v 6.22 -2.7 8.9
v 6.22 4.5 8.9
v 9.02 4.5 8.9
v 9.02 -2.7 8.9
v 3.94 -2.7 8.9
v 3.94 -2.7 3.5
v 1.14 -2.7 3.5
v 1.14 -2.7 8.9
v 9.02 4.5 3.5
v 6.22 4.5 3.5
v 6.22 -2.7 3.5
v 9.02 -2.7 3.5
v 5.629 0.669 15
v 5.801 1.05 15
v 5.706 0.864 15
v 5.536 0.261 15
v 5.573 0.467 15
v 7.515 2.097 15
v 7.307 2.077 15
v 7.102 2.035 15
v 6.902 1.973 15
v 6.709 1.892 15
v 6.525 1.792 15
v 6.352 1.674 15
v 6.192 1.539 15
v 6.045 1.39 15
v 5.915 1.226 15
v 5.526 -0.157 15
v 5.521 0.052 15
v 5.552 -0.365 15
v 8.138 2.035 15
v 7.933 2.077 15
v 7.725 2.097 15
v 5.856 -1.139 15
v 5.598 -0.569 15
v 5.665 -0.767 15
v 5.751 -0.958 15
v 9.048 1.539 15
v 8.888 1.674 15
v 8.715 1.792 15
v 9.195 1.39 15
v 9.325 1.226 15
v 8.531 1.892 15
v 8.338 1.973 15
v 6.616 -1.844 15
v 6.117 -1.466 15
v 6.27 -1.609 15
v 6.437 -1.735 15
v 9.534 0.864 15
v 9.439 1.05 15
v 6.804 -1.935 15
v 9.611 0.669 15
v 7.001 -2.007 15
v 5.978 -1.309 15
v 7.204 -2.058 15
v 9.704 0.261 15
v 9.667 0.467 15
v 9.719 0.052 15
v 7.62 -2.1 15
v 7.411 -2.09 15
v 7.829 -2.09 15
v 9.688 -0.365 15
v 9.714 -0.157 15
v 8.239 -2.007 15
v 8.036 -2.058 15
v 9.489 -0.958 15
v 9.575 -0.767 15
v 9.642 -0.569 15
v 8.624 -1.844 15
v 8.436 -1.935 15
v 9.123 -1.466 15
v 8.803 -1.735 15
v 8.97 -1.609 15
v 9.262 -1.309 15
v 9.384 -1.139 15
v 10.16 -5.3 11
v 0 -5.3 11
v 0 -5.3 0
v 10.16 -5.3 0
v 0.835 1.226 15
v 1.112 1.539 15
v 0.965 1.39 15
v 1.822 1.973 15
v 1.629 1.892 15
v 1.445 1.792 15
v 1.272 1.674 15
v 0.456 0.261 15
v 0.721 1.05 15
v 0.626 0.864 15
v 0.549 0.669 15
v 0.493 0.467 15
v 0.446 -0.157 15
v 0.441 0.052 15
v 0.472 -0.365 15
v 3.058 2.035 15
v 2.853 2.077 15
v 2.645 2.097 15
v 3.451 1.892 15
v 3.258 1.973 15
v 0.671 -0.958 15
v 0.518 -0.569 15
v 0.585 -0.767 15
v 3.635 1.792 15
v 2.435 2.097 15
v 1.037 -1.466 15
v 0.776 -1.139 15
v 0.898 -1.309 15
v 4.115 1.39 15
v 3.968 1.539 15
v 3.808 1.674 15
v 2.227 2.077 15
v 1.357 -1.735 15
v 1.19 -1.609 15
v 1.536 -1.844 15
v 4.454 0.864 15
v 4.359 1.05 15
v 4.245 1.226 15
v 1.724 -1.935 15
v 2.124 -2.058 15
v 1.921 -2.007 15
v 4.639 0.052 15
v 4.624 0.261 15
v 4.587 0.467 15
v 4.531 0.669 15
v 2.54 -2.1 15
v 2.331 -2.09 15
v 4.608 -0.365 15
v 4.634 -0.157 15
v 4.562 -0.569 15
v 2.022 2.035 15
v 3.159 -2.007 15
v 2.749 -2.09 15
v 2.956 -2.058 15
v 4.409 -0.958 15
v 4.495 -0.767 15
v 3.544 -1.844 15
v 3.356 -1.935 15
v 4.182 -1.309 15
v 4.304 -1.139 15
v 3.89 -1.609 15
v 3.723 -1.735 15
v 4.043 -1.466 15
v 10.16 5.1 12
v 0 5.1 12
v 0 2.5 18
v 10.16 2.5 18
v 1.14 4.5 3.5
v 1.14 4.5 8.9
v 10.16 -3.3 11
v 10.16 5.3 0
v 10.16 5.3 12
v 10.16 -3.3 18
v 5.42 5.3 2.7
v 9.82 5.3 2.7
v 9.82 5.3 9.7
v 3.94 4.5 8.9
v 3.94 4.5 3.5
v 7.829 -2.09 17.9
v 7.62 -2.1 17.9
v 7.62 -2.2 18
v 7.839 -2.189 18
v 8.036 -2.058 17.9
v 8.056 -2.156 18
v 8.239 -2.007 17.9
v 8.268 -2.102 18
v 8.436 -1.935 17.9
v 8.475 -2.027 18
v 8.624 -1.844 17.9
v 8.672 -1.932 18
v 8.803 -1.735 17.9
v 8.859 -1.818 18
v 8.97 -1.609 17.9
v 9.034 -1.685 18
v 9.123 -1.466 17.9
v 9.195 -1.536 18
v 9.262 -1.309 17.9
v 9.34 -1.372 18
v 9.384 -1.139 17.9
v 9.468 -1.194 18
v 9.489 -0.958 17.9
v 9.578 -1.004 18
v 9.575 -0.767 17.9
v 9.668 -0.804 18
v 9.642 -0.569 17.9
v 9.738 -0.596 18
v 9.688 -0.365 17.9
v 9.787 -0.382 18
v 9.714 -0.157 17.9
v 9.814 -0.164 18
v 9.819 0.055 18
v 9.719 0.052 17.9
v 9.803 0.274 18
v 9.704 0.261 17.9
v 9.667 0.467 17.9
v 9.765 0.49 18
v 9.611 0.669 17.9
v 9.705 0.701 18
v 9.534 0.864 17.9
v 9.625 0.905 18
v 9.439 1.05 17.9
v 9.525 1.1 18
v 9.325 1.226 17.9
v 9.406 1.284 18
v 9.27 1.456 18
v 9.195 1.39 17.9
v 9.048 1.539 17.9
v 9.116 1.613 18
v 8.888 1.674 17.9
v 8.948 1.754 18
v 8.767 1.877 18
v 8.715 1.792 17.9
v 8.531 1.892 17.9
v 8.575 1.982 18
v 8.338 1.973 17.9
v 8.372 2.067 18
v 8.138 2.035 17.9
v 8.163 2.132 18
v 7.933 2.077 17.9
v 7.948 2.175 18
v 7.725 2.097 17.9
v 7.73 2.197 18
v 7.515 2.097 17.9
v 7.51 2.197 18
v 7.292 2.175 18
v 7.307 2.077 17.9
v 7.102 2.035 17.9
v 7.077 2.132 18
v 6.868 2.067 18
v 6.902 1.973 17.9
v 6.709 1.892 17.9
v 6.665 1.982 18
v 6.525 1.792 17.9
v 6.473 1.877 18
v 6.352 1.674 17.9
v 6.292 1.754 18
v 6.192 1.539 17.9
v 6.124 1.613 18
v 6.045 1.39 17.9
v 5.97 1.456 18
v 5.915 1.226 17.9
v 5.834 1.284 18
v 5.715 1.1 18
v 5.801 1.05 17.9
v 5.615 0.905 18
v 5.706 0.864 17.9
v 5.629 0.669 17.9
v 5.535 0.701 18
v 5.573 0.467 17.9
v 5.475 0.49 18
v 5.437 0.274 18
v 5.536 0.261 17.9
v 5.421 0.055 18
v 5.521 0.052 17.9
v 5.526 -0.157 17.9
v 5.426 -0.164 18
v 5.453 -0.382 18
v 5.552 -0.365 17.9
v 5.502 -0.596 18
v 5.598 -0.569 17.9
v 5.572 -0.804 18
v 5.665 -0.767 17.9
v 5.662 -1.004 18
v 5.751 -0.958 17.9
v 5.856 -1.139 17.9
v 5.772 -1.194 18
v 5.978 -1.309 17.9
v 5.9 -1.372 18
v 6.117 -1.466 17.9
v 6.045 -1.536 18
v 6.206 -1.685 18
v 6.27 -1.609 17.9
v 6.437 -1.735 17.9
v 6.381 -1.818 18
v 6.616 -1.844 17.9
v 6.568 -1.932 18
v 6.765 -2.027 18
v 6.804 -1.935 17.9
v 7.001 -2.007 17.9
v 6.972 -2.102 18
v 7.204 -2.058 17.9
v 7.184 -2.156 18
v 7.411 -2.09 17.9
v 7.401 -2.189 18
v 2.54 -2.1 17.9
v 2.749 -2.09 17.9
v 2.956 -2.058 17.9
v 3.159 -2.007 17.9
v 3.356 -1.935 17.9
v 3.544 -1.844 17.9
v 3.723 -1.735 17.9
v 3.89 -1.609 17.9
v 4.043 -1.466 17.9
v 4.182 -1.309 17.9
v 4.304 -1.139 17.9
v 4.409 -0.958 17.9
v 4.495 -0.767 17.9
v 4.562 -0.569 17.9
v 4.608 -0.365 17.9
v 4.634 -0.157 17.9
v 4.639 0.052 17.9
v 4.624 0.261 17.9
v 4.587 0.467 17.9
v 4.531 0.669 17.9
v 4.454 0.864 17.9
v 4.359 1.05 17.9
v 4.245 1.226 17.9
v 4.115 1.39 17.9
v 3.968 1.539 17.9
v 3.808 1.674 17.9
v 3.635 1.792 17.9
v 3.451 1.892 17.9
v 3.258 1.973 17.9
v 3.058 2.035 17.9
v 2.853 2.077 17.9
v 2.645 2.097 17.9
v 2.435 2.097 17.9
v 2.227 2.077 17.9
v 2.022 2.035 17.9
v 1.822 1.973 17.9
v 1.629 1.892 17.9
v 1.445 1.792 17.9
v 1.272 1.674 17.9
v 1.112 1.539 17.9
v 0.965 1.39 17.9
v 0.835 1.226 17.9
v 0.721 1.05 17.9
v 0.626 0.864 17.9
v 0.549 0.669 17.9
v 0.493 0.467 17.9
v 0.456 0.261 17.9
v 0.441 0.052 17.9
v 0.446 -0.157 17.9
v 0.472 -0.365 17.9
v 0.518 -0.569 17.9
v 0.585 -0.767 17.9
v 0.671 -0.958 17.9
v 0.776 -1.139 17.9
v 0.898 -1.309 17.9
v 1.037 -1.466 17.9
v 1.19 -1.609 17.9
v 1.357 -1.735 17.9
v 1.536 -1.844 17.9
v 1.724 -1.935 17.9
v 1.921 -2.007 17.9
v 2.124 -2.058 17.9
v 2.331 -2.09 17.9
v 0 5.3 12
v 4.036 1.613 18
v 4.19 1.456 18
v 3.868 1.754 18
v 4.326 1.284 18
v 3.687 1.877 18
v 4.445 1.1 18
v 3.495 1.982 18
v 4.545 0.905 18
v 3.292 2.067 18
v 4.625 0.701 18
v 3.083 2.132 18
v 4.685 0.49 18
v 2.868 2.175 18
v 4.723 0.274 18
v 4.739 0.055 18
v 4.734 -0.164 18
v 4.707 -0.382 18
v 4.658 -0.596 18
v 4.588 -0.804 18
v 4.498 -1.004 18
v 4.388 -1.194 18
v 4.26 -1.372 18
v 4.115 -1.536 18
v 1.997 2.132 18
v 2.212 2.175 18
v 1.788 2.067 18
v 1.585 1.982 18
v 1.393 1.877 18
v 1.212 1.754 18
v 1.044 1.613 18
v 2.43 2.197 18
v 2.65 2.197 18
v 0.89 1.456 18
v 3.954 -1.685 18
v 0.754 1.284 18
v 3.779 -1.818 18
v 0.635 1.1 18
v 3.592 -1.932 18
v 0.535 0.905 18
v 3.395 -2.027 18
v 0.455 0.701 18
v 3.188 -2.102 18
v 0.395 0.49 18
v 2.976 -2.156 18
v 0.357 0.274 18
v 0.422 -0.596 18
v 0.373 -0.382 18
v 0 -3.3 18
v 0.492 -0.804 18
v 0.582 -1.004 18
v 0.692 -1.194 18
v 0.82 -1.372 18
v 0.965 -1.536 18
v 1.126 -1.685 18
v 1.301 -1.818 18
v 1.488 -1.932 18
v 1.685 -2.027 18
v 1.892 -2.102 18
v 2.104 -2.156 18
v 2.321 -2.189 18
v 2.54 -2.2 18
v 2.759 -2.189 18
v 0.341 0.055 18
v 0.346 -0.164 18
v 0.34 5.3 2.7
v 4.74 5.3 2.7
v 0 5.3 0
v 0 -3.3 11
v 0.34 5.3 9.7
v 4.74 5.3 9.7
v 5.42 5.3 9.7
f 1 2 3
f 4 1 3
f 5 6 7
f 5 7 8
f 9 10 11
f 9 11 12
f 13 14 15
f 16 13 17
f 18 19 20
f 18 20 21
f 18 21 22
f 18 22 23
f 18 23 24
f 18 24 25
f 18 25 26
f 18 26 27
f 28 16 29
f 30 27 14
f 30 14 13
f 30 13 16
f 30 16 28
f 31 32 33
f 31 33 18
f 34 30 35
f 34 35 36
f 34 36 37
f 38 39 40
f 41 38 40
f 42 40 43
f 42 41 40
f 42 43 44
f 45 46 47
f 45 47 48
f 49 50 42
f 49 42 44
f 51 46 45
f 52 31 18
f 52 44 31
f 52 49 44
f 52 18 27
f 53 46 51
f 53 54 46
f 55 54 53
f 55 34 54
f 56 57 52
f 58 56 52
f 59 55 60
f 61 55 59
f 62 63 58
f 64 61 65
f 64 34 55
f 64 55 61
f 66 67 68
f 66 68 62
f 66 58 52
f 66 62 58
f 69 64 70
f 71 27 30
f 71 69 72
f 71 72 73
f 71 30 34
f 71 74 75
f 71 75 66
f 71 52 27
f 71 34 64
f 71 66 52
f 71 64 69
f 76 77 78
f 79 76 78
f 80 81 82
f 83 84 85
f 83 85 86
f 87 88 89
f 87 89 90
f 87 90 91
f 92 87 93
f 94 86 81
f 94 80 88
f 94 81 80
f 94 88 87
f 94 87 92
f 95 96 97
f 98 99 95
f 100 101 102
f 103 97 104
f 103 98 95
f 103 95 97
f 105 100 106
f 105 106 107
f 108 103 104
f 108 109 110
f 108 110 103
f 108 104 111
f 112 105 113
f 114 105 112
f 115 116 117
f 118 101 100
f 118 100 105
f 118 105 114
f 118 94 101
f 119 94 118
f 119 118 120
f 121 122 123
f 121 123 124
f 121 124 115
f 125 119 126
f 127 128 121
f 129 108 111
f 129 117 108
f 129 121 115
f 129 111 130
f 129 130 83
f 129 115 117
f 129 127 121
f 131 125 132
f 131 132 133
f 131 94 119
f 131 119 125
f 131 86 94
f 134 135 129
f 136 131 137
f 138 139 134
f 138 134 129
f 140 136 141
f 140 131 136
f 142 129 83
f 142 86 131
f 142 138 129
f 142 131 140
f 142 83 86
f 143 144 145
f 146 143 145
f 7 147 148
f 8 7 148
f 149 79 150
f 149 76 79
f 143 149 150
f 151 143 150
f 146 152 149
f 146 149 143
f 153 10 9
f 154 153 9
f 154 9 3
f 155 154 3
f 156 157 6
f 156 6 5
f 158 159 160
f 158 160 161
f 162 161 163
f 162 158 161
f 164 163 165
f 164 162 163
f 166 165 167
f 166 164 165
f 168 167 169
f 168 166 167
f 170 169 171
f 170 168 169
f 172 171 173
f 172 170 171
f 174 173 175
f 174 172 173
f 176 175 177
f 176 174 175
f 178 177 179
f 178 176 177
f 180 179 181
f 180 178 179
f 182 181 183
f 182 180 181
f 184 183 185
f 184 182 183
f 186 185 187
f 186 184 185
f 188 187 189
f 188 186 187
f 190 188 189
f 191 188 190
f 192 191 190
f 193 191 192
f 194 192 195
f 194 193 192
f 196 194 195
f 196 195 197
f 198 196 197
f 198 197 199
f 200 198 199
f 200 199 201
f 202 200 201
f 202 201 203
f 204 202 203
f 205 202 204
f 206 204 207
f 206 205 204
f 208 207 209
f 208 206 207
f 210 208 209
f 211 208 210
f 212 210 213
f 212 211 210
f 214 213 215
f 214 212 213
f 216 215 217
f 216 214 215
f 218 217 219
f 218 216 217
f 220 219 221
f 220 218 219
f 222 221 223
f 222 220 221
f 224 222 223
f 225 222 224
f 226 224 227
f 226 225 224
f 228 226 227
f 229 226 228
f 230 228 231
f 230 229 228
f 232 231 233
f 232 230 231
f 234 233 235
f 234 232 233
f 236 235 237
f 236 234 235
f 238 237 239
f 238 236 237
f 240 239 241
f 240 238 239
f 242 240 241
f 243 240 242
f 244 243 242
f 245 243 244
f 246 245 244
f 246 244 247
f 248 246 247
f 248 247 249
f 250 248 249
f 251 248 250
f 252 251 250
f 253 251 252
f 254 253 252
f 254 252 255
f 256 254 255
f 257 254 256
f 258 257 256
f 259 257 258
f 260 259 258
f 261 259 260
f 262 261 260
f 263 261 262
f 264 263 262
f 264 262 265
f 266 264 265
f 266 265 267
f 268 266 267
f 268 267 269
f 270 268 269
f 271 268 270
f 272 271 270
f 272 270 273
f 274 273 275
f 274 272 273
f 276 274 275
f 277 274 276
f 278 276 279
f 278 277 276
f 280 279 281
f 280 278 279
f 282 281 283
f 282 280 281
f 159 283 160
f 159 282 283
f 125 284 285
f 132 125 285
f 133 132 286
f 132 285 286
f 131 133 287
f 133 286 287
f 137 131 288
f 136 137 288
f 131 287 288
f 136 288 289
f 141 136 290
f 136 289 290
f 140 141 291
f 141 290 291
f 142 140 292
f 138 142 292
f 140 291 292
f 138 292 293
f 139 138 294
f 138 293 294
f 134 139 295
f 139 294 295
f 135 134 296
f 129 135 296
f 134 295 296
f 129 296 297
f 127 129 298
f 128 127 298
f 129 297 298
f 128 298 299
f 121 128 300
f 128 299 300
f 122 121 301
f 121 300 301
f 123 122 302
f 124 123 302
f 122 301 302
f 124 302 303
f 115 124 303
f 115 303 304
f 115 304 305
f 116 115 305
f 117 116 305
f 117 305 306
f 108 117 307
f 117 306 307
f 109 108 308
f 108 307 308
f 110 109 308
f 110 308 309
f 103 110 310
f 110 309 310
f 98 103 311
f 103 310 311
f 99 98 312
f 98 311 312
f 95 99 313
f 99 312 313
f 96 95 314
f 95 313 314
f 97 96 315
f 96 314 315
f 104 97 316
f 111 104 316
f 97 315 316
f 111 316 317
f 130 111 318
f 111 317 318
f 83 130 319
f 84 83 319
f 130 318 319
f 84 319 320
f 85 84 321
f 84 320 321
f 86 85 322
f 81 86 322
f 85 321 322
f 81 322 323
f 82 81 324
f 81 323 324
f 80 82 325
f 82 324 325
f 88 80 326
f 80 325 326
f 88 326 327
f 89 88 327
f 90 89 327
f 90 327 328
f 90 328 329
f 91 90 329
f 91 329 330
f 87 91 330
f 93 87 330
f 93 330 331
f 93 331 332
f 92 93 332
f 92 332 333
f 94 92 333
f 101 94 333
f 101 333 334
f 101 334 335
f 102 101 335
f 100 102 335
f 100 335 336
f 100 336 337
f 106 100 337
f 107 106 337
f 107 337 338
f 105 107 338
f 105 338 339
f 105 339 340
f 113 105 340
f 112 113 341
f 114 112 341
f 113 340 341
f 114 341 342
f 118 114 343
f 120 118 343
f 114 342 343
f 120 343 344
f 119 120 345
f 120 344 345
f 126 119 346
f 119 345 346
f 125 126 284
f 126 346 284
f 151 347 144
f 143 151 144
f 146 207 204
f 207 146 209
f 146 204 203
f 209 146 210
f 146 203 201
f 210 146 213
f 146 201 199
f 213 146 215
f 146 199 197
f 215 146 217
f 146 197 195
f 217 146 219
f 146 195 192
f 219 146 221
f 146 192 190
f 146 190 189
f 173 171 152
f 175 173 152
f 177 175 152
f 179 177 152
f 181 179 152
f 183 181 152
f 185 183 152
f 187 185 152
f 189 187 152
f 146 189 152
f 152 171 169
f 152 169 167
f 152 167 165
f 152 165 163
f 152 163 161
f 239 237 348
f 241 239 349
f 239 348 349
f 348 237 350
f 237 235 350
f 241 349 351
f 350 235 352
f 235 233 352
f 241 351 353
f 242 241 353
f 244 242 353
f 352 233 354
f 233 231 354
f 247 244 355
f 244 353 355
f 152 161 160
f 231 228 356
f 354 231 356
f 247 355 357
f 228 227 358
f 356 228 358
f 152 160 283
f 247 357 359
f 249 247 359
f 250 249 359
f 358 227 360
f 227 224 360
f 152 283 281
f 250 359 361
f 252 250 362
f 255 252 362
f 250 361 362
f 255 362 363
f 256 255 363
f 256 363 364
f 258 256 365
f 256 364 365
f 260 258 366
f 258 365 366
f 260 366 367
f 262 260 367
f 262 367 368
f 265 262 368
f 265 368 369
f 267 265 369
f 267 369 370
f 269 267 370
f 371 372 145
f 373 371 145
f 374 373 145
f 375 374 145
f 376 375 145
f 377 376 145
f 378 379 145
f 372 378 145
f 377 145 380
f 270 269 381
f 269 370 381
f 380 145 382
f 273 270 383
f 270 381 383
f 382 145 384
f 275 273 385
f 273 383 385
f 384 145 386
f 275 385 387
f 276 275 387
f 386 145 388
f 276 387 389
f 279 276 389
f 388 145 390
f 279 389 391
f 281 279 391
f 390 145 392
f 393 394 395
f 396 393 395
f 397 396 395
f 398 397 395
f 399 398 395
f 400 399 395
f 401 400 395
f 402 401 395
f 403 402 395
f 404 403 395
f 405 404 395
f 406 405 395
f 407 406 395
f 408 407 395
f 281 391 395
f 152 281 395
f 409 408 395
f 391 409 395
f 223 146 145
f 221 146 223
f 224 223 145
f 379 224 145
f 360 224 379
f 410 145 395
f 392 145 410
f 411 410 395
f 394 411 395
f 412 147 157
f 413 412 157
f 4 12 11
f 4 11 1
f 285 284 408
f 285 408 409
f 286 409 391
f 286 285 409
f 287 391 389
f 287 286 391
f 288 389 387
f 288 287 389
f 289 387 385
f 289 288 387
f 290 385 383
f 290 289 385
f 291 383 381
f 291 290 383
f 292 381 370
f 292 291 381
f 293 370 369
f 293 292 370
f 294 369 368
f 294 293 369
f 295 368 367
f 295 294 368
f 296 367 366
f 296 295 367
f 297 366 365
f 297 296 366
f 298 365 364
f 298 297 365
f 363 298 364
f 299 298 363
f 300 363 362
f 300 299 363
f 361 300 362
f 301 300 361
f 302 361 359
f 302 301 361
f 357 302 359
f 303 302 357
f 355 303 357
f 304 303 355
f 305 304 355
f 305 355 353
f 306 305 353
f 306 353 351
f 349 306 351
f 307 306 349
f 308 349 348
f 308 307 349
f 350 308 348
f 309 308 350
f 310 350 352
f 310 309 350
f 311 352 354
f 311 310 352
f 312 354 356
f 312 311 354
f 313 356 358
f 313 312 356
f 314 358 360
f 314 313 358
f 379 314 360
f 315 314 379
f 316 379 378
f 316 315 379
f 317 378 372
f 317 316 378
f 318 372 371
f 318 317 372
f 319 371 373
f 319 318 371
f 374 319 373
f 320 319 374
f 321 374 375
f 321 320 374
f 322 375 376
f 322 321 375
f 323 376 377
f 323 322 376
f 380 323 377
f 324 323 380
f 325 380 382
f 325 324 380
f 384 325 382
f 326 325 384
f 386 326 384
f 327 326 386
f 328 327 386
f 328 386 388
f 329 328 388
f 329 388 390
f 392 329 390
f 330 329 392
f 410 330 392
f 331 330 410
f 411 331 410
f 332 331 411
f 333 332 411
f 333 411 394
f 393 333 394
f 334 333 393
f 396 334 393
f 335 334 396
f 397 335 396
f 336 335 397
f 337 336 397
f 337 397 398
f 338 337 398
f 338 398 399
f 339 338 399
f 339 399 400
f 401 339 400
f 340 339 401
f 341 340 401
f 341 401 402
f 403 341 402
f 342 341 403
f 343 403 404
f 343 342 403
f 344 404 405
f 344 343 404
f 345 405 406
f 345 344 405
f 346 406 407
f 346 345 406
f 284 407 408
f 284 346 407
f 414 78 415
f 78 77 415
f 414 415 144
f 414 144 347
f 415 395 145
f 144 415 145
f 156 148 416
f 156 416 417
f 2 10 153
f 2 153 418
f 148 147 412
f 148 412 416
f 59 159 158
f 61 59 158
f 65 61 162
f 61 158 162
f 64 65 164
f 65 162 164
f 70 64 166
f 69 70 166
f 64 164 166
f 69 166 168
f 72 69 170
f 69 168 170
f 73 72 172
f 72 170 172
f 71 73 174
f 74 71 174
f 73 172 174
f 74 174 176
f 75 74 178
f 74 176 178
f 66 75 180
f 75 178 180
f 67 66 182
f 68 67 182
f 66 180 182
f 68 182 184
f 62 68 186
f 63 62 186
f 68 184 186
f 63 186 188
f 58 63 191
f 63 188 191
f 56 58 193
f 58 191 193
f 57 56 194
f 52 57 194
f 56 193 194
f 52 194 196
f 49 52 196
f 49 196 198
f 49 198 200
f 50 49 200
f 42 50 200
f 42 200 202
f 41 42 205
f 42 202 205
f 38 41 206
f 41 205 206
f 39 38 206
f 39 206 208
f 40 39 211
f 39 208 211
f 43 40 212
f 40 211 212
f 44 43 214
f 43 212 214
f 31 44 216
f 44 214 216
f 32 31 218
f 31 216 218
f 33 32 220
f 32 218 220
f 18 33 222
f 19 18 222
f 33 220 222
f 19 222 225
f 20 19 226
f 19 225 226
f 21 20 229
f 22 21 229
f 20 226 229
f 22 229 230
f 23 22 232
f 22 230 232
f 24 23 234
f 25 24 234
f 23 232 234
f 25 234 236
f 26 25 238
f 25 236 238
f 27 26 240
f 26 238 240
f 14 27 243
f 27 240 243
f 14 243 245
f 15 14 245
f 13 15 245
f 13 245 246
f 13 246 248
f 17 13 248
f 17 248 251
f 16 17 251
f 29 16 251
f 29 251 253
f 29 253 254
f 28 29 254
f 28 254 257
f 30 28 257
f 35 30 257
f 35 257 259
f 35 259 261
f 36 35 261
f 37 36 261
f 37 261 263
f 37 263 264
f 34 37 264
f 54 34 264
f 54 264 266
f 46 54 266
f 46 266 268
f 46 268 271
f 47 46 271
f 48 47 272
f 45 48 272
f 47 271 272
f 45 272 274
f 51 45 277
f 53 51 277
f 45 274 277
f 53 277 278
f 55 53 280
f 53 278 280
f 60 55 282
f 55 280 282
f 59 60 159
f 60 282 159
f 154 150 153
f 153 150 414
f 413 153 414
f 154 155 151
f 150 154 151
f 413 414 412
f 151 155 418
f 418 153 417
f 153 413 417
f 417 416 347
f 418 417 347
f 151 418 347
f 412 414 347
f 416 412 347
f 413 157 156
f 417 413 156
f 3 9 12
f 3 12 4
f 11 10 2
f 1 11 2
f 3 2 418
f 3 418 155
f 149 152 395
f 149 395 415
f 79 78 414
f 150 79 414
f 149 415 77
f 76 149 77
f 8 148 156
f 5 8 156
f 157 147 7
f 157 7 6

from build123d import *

# Parameters (mm, degrees)
PAD_DEPTH       = 10.16
SKETCH001_R     = 2.1
POCKET_DEPTH    = 3
SKETCH002_W     = 5.4
SKETCH002_H     = 2.8
POCKET001_DEPTH = 8
CHAMFER_SIZE    = 0.8
CHAMFER001_SIZE = 0.1


with BuildPart() as part:
    # Sketch → Pad (new body)
    with BuildSketch(Plane.YZ):
        Polygon((-5.3, 0), (5.3, 0), (5.3, 12), (5.1, 12), (2.5, 18), (-3.3, 18), (-3.3, 11), (-5.3, 11), align=None)
    extrude(amount=PAD_DEPTH)

    # Sketch001 (on Face5 of Pad) → Pocket (cut)
    with BuildSketch(Plane(origin=(0, 0, 18), x_dir=(0, -1, 0), z_dir=(0, 0, 1))):
        with Locations((0, 2.54)):
            Circle(SKETCH001_R)
        with Locations((0, 7.62)):
            Circle(SKETCH001_R)
    extrude(amount=-POCKET_DEPTH, mode=Mode.SUBTRACT)

    # Sketch002 (on Face3 of Pocket) → Pocket001 (cut)
    with BuildSketch(Plane.ZX.offset(5.3)):
        with Locations((6.2, 7.62)):
            Rectangle(SKETCH002_W, SKETCH002_H)
        with Locations((6.2, 2.54)):
            Rectangle(SKETCH002_W, SKETCH002_H)
    extrude(amount=-POCKET001_DEPTH, mode=Mode.SUBTRACT)

    # Chamfer
    chamfer_edges = [part.edges().sort_by_distance(p)[0] for p in [
        (6.22, 5.3, 6.2),
        (7.62, 5.3, 8.9),
        (9.02, 5.3, 6.2),
        (7.62, 5.3, 3.5),
        (3.94, 5.3, 6.2),
        (2.54, 5.3, 8.9),
        (1.14, 5.3, 6.2),
        (2.54, 5.3, 3.5),
    ]]
    chamfer(chamfer_edges, length=CHAMFER_SIZE)

    # Chamfer001
    chamfer001_edges = [part.edges().sort_by_distance(p)[0] for p in [
        (7.62, 2.1, 18),
        (2.54, 2.1, 18),
    ]]
    chamfer(chamfer001_edges, length=CHAMFER001_SIZE)


solid = part.part
